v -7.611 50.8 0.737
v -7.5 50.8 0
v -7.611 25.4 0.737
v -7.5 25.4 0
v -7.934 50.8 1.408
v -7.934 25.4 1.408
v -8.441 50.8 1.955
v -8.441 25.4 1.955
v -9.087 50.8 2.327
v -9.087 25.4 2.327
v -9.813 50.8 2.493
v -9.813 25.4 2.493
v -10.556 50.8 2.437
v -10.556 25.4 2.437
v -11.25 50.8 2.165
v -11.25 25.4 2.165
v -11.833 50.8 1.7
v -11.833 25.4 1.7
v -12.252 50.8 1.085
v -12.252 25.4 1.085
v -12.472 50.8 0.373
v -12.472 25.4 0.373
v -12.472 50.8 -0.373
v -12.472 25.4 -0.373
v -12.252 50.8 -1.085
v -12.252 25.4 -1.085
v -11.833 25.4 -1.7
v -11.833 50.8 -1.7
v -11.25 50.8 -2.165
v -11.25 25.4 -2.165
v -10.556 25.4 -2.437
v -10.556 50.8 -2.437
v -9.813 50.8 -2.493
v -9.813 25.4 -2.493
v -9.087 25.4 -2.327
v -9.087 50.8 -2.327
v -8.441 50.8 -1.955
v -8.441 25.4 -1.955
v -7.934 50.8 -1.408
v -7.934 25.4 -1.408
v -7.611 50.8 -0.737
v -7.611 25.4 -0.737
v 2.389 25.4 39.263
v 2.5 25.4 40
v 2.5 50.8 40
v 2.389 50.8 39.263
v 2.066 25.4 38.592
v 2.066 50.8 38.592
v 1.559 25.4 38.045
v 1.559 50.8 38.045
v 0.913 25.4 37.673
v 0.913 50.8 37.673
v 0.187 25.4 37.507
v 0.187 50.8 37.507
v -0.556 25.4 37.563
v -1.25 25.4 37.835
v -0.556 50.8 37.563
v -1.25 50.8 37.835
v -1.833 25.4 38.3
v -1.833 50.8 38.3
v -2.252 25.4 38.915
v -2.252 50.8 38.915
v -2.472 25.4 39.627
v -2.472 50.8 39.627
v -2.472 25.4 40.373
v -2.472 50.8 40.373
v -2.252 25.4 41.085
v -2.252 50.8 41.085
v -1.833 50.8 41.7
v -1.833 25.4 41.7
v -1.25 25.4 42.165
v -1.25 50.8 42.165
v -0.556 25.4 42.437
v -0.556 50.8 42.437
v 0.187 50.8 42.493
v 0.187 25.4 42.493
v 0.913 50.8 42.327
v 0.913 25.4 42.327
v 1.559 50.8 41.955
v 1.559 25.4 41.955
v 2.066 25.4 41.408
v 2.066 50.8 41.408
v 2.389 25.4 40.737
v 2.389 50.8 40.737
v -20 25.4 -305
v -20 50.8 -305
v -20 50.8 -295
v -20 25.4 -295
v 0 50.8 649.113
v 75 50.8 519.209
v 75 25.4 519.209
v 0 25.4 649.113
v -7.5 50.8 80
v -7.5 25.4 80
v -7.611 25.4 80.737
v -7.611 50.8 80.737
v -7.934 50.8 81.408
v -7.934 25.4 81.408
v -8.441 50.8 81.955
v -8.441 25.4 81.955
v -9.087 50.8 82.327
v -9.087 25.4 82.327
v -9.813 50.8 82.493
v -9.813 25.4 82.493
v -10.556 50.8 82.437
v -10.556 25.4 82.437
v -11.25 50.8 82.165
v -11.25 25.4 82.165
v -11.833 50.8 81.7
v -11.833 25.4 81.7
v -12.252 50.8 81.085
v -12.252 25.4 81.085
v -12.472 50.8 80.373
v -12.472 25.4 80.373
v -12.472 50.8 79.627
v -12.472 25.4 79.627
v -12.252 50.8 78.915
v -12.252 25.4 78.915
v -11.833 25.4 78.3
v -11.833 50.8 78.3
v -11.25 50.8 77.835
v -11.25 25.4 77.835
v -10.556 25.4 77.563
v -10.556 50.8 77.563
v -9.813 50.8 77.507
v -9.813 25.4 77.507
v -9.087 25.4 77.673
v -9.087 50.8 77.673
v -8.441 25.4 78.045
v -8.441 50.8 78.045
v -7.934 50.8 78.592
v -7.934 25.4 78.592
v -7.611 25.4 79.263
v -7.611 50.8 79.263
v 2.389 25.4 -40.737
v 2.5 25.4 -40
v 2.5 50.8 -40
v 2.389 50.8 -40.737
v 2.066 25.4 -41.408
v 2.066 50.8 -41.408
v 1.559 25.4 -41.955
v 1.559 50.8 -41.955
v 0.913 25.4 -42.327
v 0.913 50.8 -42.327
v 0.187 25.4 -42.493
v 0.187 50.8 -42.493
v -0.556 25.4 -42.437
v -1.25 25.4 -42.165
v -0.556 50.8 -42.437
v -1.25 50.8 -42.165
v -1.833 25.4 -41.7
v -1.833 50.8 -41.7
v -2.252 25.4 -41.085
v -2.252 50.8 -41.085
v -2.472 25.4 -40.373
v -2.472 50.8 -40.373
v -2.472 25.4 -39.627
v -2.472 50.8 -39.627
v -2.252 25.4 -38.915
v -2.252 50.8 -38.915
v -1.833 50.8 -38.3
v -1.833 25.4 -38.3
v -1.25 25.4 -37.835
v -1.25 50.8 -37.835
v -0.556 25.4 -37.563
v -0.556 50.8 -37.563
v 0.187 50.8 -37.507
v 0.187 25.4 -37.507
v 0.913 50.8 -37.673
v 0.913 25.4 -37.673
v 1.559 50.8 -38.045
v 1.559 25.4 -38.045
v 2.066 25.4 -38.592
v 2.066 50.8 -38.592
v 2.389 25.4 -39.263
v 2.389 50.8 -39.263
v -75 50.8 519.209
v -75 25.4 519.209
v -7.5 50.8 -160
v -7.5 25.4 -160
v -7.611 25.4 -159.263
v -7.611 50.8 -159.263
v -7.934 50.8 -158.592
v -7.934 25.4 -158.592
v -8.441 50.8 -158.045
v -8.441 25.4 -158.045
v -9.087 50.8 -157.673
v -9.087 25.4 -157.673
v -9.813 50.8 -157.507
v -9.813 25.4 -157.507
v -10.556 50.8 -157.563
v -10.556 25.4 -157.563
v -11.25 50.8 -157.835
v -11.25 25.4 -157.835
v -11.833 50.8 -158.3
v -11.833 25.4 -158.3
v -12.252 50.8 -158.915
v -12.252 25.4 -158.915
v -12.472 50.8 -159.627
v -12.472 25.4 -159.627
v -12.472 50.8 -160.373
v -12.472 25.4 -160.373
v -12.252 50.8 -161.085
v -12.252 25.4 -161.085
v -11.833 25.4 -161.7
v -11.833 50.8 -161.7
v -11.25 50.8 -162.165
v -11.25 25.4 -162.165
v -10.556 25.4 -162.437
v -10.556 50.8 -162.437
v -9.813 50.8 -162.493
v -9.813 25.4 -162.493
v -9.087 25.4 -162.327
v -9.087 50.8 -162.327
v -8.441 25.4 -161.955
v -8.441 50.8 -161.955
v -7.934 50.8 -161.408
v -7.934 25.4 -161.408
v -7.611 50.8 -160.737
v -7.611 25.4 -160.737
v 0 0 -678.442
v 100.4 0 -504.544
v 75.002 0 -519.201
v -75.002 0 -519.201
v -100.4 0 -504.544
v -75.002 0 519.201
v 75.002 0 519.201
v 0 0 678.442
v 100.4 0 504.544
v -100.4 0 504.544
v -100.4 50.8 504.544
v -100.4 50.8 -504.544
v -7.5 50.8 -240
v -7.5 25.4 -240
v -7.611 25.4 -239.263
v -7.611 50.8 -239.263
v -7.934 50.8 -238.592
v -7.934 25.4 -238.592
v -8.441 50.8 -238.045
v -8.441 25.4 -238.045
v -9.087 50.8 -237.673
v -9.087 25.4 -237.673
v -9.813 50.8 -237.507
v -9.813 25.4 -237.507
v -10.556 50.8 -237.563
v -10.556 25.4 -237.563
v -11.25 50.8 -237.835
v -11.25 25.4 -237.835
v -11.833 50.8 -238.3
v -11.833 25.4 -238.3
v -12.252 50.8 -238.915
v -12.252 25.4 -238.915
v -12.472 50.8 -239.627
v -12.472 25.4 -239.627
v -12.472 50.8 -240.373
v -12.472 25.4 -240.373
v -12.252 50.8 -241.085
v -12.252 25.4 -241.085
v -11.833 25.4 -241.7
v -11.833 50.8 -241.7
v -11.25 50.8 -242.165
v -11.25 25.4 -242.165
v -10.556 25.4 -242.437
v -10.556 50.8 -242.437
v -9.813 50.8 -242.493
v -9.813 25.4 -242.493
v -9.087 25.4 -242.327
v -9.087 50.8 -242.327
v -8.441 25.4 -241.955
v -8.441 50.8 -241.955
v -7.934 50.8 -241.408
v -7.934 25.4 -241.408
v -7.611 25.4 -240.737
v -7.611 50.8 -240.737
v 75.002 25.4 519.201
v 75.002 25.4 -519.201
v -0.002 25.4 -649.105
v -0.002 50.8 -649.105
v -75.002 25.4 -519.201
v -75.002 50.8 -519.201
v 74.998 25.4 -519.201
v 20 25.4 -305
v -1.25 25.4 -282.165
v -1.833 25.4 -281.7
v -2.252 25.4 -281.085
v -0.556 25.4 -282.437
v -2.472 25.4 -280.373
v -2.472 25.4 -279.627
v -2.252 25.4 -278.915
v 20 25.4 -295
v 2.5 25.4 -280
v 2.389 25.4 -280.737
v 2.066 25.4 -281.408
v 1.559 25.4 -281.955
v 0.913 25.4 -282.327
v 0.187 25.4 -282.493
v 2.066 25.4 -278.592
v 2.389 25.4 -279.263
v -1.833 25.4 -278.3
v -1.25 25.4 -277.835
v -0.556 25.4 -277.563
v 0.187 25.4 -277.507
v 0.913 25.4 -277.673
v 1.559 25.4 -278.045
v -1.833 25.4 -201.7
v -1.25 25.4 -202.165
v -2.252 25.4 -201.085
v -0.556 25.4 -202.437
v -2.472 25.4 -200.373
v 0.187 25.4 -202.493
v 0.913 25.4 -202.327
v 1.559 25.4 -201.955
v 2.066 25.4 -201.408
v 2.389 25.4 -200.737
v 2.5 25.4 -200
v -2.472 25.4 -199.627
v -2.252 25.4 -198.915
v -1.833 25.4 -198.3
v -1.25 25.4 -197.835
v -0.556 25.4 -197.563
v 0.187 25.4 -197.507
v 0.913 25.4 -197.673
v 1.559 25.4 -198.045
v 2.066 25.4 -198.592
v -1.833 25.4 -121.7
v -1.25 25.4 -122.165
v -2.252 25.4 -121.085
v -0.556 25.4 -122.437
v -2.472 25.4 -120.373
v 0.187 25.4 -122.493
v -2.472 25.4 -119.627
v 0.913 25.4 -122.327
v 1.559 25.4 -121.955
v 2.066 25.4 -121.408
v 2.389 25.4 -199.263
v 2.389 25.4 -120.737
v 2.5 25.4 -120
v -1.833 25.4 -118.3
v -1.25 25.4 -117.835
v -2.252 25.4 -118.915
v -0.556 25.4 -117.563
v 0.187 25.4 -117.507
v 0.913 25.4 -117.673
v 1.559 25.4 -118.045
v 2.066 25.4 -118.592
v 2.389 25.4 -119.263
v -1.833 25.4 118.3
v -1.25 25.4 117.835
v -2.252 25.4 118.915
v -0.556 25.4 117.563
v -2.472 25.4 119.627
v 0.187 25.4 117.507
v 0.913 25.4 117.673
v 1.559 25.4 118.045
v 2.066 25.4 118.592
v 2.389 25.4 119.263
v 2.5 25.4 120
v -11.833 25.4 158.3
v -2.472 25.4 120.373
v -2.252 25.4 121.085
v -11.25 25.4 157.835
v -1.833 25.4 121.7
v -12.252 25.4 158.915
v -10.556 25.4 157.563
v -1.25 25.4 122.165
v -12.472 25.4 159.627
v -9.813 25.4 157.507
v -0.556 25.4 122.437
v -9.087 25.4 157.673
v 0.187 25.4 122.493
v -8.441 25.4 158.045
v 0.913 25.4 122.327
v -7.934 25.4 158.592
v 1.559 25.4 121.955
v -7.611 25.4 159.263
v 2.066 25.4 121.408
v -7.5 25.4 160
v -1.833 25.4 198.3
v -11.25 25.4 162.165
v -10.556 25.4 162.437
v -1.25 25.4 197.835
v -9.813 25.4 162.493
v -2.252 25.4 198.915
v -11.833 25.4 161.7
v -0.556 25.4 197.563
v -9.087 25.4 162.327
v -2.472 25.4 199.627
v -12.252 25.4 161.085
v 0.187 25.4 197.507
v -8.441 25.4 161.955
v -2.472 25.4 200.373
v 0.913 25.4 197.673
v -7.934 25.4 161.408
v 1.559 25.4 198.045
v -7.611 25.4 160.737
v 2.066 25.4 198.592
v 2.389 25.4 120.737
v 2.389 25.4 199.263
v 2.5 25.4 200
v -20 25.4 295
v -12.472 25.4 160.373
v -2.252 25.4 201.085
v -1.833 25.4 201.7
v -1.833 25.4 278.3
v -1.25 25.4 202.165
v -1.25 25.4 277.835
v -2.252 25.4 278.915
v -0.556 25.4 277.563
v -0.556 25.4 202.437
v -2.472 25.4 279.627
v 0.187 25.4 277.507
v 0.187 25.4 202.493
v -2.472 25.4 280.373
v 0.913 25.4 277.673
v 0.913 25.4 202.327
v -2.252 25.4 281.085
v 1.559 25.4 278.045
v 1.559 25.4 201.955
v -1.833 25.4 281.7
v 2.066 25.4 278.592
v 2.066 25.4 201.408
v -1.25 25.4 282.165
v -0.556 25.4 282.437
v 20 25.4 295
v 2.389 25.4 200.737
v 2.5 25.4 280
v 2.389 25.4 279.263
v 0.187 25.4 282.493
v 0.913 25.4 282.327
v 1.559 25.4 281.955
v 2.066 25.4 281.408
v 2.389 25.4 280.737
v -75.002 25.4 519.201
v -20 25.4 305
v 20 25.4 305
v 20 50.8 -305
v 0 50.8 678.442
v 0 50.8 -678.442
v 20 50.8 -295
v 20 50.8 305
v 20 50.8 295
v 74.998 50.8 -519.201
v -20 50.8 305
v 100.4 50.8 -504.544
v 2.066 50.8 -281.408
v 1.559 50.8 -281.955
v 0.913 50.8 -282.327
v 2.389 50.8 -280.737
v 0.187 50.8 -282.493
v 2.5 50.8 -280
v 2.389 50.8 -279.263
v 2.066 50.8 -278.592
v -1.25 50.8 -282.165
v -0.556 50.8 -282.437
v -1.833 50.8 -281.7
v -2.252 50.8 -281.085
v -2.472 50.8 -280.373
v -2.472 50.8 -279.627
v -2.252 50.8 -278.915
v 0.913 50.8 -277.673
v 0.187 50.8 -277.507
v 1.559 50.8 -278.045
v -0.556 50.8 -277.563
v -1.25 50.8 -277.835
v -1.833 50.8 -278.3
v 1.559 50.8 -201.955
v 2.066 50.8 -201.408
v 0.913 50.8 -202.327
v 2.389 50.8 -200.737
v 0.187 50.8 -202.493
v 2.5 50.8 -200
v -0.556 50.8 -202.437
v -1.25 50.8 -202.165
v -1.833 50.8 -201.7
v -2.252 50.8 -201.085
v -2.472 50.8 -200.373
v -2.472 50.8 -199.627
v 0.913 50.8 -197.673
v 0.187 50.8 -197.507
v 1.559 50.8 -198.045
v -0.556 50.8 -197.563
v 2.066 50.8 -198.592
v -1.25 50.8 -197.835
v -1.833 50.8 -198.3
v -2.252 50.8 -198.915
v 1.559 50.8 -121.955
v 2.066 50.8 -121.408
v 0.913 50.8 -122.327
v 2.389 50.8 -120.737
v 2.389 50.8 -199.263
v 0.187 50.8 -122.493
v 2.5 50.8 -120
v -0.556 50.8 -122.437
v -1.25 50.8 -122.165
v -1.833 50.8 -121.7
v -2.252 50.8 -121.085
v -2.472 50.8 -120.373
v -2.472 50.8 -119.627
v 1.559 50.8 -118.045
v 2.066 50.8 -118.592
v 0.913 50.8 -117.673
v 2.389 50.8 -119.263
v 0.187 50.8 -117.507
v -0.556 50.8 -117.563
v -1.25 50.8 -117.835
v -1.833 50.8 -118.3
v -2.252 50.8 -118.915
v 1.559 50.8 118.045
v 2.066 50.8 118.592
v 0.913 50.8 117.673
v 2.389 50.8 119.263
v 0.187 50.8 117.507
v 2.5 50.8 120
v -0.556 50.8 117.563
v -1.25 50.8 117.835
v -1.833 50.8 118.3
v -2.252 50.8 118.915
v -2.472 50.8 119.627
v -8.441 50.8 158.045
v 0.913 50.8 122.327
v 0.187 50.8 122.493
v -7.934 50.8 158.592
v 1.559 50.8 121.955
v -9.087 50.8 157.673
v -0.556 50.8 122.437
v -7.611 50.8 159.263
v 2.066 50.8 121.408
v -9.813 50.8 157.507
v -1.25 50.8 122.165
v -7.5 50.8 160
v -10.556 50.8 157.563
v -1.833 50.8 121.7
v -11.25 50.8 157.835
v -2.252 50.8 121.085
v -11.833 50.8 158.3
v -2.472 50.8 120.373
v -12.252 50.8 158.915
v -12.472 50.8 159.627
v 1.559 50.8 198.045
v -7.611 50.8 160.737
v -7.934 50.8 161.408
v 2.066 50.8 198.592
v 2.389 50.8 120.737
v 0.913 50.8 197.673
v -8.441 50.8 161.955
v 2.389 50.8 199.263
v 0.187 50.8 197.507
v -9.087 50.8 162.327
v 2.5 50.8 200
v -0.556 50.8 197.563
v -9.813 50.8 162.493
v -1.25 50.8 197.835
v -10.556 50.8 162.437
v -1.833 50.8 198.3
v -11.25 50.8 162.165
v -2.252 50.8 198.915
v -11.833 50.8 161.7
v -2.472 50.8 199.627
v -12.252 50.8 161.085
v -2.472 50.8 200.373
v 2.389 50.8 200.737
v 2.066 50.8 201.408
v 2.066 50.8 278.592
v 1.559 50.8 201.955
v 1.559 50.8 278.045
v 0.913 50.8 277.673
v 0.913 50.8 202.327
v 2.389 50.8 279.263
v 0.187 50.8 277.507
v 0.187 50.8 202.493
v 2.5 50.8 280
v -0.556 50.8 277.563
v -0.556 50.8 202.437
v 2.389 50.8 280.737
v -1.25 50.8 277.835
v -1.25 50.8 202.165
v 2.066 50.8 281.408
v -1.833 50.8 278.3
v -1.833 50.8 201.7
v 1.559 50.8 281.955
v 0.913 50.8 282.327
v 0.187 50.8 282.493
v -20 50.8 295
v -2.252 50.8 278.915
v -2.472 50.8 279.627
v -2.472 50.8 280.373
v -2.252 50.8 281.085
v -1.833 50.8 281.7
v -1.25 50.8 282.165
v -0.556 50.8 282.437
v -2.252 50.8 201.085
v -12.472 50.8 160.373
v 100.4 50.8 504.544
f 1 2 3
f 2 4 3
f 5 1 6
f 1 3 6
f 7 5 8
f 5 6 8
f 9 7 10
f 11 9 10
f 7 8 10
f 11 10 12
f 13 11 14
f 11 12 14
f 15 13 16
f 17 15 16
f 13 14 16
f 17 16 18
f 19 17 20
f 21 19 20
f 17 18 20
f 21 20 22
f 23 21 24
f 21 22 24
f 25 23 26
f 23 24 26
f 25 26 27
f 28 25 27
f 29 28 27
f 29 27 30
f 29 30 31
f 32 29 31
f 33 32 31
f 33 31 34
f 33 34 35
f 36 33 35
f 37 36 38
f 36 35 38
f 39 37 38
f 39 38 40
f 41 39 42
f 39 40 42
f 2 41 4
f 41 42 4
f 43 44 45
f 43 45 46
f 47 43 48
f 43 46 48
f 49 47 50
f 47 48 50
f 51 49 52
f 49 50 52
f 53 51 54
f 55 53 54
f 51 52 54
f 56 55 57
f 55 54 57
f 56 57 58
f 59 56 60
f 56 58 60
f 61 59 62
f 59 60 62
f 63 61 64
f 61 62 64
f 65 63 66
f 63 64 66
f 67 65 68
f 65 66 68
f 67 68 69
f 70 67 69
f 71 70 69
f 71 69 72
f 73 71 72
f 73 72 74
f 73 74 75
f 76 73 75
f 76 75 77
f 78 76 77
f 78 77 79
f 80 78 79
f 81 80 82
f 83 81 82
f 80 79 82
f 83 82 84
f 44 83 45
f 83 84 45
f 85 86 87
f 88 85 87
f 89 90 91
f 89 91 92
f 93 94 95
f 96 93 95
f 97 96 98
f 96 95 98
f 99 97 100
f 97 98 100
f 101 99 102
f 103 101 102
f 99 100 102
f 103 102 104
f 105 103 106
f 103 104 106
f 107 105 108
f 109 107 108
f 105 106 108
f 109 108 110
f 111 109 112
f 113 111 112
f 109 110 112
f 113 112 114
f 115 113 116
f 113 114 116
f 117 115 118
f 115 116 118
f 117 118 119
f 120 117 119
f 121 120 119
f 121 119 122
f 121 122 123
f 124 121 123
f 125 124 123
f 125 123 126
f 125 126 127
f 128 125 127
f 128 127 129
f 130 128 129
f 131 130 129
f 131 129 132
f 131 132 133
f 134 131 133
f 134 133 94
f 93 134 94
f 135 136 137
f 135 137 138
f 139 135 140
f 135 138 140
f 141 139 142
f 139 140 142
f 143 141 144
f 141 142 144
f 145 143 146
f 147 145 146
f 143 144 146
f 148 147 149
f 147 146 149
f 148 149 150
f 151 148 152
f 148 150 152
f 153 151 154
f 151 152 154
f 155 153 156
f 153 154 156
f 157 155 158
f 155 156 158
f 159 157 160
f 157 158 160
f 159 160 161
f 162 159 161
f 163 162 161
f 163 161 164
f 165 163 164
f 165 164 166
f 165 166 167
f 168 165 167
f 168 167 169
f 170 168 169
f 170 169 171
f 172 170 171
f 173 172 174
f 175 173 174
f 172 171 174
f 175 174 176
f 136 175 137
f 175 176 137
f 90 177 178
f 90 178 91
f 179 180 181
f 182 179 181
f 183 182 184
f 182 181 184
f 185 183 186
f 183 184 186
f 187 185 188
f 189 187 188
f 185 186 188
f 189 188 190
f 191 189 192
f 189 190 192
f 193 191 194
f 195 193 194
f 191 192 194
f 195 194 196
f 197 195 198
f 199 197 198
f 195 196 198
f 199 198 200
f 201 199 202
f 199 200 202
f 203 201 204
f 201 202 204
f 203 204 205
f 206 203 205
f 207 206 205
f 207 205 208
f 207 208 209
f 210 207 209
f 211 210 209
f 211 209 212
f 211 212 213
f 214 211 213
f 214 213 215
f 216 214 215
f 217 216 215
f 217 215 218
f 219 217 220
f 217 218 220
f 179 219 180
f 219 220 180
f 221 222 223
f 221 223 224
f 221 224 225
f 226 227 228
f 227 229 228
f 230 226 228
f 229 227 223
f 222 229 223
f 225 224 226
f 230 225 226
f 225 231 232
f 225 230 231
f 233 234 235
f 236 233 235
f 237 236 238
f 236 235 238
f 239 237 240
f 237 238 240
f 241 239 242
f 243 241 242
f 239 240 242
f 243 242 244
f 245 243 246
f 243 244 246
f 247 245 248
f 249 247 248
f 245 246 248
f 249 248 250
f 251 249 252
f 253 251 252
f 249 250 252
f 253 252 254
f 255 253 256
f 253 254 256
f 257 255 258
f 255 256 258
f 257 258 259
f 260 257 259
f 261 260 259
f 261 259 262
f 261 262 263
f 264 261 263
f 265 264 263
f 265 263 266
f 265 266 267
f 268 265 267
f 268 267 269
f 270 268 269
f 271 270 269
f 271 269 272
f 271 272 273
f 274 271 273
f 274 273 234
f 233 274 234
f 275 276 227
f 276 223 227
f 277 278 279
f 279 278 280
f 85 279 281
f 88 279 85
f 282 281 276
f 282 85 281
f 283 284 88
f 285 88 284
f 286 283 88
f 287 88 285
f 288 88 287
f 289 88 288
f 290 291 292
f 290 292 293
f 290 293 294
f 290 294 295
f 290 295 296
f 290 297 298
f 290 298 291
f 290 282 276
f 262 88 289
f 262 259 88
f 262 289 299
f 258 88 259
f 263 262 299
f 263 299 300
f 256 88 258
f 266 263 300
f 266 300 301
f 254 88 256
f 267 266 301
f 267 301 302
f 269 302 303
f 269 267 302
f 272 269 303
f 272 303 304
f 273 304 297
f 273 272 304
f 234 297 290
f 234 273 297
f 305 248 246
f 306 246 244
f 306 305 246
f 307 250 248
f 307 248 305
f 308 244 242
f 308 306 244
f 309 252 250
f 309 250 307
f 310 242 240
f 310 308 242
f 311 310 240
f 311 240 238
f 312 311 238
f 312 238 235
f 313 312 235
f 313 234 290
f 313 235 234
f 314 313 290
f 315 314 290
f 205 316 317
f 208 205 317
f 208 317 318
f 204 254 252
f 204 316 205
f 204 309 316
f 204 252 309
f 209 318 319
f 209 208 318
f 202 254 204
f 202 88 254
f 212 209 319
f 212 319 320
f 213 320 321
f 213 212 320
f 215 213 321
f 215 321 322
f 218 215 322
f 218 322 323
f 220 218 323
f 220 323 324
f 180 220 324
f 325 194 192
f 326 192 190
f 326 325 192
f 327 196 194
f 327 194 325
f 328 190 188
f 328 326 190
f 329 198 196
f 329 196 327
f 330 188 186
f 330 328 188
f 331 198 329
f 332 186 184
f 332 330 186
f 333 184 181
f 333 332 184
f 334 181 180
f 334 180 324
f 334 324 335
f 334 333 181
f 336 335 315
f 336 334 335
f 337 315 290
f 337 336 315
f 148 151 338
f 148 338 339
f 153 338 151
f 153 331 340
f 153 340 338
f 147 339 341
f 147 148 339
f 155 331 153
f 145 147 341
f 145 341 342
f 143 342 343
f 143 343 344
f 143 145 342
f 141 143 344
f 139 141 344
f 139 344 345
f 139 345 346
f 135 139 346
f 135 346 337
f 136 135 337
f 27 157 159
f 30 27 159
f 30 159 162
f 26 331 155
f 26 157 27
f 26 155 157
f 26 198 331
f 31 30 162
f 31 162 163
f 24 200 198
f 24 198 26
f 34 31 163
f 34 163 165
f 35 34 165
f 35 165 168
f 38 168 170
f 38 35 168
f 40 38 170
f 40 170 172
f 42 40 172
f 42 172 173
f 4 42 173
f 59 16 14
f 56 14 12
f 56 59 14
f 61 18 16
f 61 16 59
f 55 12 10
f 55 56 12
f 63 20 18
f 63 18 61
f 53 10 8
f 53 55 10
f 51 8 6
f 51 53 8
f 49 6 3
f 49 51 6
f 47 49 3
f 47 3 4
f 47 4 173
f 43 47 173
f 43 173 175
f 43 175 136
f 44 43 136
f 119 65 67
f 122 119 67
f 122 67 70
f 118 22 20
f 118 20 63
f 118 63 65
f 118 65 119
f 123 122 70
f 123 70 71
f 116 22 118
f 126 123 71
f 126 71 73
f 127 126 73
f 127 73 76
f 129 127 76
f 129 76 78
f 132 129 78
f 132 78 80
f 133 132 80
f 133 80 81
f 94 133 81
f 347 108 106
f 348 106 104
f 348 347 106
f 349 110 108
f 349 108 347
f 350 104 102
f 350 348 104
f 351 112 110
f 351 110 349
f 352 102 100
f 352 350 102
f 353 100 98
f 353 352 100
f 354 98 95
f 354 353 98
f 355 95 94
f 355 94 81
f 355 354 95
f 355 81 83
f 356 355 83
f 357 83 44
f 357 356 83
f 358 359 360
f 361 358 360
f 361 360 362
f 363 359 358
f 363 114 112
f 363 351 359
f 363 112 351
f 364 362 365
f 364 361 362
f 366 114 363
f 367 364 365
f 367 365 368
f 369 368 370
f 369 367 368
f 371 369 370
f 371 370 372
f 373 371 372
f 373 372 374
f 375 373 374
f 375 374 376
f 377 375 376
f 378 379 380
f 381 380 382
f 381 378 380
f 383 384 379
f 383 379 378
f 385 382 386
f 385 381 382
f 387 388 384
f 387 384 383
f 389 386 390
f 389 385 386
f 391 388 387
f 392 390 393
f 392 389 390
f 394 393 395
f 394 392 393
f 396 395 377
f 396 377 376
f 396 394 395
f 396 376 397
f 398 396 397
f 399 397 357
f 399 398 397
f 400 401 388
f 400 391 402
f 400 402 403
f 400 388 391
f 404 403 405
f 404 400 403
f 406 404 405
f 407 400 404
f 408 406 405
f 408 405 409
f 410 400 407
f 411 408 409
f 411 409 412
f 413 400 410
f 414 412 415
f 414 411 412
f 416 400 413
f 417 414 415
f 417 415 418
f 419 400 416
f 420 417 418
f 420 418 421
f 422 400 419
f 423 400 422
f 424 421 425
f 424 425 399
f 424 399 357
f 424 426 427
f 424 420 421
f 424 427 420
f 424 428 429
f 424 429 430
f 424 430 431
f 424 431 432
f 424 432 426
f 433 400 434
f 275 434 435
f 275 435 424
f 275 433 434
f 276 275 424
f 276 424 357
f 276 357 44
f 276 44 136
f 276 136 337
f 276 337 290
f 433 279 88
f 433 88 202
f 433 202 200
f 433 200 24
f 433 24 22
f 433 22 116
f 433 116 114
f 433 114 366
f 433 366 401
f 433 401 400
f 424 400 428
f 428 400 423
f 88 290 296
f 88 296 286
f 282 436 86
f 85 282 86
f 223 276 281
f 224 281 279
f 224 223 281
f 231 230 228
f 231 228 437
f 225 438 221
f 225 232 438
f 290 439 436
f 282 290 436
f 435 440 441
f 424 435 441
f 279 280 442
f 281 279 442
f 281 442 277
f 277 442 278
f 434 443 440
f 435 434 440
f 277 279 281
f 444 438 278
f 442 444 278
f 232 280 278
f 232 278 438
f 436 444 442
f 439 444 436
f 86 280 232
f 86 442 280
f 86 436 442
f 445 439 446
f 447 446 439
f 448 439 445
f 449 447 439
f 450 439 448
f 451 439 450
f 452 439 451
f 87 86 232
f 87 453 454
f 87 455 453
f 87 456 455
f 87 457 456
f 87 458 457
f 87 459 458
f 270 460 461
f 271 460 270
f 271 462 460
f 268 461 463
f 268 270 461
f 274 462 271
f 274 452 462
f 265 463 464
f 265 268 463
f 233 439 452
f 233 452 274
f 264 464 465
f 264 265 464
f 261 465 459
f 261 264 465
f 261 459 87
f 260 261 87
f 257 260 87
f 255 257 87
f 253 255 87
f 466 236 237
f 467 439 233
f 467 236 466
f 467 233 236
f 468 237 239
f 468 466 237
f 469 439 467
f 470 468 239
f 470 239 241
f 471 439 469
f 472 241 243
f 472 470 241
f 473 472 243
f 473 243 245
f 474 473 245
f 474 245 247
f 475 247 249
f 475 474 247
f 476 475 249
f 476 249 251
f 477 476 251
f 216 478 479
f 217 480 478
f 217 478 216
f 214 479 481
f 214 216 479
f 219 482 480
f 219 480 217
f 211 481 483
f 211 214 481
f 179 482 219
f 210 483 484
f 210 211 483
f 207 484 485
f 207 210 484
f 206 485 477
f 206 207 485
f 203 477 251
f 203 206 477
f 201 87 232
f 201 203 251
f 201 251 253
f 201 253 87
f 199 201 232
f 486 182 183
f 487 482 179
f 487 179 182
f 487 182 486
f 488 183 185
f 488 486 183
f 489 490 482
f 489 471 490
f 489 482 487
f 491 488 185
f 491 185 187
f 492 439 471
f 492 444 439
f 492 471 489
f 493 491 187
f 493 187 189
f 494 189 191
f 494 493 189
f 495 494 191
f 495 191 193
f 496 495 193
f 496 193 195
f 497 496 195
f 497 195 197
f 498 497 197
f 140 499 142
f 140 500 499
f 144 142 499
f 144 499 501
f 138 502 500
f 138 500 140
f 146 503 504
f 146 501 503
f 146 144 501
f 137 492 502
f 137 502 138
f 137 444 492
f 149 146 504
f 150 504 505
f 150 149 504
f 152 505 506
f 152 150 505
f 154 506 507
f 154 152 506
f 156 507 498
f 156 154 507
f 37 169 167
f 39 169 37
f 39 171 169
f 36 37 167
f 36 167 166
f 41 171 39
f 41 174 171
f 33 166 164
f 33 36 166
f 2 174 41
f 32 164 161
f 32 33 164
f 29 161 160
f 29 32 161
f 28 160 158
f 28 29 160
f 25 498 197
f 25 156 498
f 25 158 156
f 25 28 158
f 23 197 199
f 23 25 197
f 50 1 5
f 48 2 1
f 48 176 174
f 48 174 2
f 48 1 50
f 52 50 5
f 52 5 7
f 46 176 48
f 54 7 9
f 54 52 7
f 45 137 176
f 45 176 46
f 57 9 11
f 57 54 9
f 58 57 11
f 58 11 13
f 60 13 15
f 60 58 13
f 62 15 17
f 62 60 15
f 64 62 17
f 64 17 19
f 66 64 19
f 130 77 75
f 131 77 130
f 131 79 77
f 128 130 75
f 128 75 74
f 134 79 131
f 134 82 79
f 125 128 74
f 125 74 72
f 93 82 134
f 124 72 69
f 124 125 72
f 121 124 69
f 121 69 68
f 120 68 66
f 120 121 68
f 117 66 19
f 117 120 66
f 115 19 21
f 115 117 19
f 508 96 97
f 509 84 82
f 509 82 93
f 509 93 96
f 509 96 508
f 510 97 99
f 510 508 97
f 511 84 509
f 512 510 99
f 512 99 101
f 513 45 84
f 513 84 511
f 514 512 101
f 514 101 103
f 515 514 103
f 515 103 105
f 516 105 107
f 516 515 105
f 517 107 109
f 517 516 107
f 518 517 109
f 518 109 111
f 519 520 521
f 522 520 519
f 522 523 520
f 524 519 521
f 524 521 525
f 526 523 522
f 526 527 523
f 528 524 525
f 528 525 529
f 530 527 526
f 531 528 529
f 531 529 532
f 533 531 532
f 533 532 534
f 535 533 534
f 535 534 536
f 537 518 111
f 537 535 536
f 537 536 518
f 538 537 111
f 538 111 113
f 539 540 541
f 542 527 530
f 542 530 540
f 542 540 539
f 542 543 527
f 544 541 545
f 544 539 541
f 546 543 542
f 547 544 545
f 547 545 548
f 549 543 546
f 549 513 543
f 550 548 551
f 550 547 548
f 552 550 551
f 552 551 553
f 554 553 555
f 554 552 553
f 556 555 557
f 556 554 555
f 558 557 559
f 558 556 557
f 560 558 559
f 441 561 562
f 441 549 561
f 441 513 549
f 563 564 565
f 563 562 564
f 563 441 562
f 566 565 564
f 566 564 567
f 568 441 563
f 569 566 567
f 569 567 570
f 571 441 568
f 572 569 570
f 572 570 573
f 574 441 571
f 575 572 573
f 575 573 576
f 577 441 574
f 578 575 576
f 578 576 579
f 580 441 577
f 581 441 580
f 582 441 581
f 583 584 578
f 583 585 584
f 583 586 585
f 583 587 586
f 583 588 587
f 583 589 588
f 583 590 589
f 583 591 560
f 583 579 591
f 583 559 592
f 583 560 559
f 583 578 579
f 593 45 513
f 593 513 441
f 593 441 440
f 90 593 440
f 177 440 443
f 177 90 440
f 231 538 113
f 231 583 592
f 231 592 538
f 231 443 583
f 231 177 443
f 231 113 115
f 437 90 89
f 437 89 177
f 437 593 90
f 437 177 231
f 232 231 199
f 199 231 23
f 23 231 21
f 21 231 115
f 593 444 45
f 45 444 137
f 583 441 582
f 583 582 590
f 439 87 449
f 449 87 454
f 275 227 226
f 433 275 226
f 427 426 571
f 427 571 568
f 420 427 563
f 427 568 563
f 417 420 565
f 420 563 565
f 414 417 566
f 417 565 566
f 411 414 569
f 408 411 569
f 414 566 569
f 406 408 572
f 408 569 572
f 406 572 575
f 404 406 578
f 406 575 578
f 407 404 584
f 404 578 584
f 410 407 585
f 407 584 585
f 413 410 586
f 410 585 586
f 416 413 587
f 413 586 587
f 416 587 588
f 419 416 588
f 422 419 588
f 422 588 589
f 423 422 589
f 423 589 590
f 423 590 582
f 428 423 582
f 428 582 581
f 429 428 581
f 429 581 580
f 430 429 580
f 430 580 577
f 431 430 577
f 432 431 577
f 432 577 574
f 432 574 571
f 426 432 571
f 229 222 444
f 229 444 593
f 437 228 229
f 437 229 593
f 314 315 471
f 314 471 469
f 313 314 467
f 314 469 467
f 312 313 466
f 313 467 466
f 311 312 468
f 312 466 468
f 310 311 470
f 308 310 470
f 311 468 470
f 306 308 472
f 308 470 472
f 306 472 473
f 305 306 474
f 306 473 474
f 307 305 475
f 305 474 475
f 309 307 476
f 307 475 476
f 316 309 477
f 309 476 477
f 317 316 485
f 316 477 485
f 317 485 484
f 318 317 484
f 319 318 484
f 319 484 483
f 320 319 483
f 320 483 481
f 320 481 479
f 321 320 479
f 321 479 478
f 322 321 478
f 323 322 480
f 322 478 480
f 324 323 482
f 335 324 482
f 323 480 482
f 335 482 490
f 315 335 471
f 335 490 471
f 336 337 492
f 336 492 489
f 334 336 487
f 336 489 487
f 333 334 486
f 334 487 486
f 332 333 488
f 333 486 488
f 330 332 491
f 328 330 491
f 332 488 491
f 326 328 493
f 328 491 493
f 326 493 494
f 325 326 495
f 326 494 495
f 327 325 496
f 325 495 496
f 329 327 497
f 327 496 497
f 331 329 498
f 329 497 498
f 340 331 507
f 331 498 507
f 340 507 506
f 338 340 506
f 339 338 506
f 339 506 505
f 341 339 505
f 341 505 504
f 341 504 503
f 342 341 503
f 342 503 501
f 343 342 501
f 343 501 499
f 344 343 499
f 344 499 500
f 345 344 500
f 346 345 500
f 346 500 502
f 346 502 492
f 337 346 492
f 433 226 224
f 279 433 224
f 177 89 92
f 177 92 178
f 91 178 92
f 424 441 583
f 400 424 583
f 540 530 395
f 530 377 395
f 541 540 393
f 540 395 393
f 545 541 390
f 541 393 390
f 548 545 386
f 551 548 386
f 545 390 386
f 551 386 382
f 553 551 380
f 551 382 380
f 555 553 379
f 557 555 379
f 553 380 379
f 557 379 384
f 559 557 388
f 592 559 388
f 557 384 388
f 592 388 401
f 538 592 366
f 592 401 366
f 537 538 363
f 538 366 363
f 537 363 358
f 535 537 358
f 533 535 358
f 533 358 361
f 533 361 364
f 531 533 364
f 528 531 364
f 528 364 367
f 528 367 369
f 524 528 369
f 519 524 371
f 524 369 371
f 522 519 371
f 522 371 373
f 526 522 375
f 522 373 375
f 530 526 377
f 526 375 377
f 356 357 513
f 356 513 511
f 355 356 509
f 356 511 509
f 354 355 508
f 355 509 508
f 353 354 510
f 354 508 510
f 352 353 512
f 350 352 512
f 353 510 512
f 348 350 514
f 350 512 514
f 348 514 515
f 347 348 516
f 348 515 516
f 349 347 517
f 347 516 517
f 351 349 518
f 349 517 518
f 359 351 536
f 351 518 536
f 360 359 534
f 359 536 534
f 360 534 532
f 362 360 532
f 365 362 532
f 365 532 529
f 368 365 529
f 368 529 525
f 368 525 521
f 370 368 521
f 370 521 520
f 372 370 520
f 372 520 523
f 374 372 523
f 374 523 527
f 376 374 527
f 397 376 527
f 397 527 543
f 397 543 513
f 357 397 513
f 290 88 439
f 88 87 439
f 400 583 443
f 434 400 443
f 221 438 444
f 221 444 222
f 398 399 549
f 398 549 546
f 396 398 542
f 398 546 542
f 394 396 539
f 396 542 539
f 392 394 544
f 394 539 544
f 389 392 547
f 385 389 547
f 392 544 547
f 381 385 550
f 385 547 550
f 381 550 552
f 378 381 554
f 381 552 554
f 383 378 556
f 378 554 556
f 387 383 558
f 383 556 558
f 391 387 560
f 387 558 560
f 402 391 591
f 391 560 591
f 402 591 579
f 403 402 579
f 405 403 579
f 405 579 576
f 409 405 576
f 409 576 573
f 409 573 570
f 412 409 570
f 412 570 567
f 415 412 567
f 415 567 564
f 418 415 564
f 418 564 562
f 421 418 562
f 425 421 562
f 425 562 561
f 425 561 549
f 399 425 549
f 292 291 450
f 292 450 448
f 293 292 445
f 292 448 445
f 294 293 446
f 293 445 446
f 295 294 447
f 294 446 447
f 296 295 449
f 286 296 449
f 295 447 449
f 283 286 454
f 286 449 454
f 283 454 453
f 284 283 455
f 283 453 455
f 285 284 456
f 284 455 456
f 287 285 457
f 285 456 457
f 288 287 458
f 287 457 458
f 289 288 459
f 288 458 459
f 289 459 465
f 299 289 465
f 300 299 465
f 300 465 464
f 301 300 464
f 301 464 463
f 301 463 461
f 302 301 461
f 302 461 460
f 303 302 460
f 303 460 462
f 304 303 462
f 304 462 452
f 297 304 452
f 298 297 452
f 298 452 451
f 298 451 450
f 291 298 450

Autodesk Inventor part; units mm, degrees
sketch "Sketch1" plane through (0, 0, 0) normal (0, 1, 0) x (-1, 0, 0)
  line L0 (-100.4, 678.442) -> (100.4, 678.442)
  line L1 (100.4, 678.442) -> (100.4, -678.442)
  line L2 (100.4, -678.442) -> (-100.4, -678.442)
  line L3 (-100.4, -678.442) -> (-100.4, 678.442)
  line L4 (-100.4, 678.442) -> (100.4, -678.442) construction
  line L5 (100.4, 678.442) -> (-100.4, -678.442) construction
  point P0 (0, 0)
  dimension "d0" = 200.8
  dimension "d1" = 1356.884
extrude "Extrusion1" add sketch "Sketch1" along normal blind 50.8
sketch "Sketch2" plane through (0, 50.8, 0) normal (0, 1, 0) x (1, 0, 0)
  line L0 (-100.4, -678.442) -> (100.4, -678.442) projected
  line L1 (0, -678.442) -> (-100.4, -504.5441)
  line L2 (0, -678.442) -> (200.8, -678.442) construction
  line L3 (-100.4, -504.5441) -> (100.4, -504.5441)
  line L4 (100.4, -678.442) -> (100.4, 678.442) projected
  line L5 (0, -678.442) -> (100.4, -504.5441)
  line L6 (0, 678.442) -> (-100.4062, 504.5334)
  line L7 (0, 678.442) -> (200.8124, 678.442) construction
  line L8 (-100.4062, 504.5334) -> (100.4, 504.5334)
  line L9 (0, 678.442) -> (100.4, 504.5334)
  point P0 (0, 0)
  dimension "d10" = 150
  dimension "d11" = 150
  dimension "d12" = 60
  dimension "d4" = 200.8
  dimension "d5" = 120
  dimension "d6" = 200.8124
  dimension "d7" = 120
ref_plane "Work Plane1" through (0, 50.8, 678.442) normal (0.866, 0, 0.5) x (0, -1, 0)
split "Split1" plane through (0, 50.8, 678.442) removes the side toward (0.866, 0, 0.5)
ref_plane "Work Plane2" through (0, 0, 678.442) normal (-0.866, 0, 0.5) x (0, 1, 0)
ref_plane "Work Plane3" through (0, 0, -678.442) normal (0.866, 0, 0.5) x (0, 1, 0)
split "Split2" plane through (0, 0, -678.442) removes the side toward (-0.866, 0, -0.5)
split "Split3" plane through (0, 0, 678.442) removes the side toward (-0.866, 0, 0.5)
ref_plane "Work Plane4" through (0, 0, -678.442) normal (0.866, 0, -0.5) x (0, 1, 0)
split "Split4" plane through (0, 0, -678.442) removes the side toward (0.866, 0, -0.5)
sketch "Sketch3" plane through (0, 50.8, 0) normal (0, 1, 0) x (1, 0, 0)
  line L0 (-75, -519.2088) -> (75, -519.2088)
  line L1 (75, -519.2088) -> (0, -649.1126)
  line L2 (0, -649.1126) -> (-75, -519.2088)
  line L3 (-75.0016, 519.2007) -> (74.9984, 519.2007)
  line L4 (74.9984, 519.2007) -> (-0.0016, 649.1046)
  line L5 (-0.0016, 649.1046) -> (-75.0016, 519.2007)
  circle A0 centre (-0.0016, 562.502) radius 43.3013
  circle A1 centre (-0.0016, 562.502) radius 57.9687
  point P0 (0, 0)
  dimension "d6" = 200.8124
  dimension "d7" = 120
  dimension "d8" = 150
  dimension "d9" = 150
  dimension "d10" = 150
  dimension "d11" = 150
  dimension "d12" = 60
sketch "Sketch4" plane through (0, 50.8, 0) normal (0, 1, 0) x (1, 0, 0)
  point P0 (0, 0)
sketch "Sketch5" plane through (0, 50.8, 0) normal (0, 1, 0) x (1, 0, 0)
  point P0 (0, 0)
extrude "Extrusion2" cut sketch "Sketch3" against normal blind 25.4 contours L0 L1 L2
sketch "Sketch6" plane through (0, 50.8, 0) normal (0, 1, 0) x (1, 0, 0)
  line L0 (-75.0016, 519.2007) -> (74.9984, 519.2007)
  line L1 (74.9984, 519.2007) -> (-0.0016, 649.1046)
  line L2 (-0.0016, 649.1046) -> (-75.0016, 519.2007)
  point P0 (0, 0)
  dimension "d15" = 150
  dimension "d16" = 150
extrude "Extrusion3" cut sketch "Sketch6" against normal blind 25.4
sketch "Sketch11" plane through (0, 50.8, 0) normal (0, 1, 0) x (1, 0, 0)
  line L0 (-20, 295) -> (20, 295)
  line L1 (20, 295) -> (20, 305)
  line L2 (20, 305) -> (-20, 305)
  line L3 (-20, 305) -> (-20, 295)
  line L4 (-20, 295) -> (20, 305) construction
  line L5 (20, 295) -> (-20, 305) construction
  point P0 (0, 0)
  point P1 (0, 300)
  dimension "d42" = 40
  dimension "d43" = 10
extrude "Extrusion6" cut sketch "Sketch11" against normal blind 50.8
sketch "Sketch12" plane through (0, 50.8, 0) normal (0, 1, 0) x (1, 0, 0)
  line L0 (-20, -305) -> (20, -305)
  line L1 (20, -305) -> (20, -295)
  line L2 (20, -295) -> (-20, -295)
  line L3 (-20, -295) -> (-20, -305)
  line L4 (-20, -305) -> (20, -295) construction
  line L5 (20, -305) -> (-20, -295) construction
  point P0 (0, 0)
  point P1 (0, -300)
  dimension "d46" = 40
  dimension "d47" = 10
extrude "Extrusion7" cut sketch "Sketch12" against normal blind 50.8
sketch "Sketch13" plane through (0, 50.8, 0) normal (0, 1, 0) x (1, 0, 0)
  circle A0 centre (0, -40) radius 2.5
  circle A1 centre (0, -120) radius 2.5
  circle A2 centre (0, -200) radius 2.5
  circle A3 centre (0, -280) radius 2.5
  circle A4 centre (0, 40) radius 2.5
  circle A5 centre (0, 100) radius 2.5
  circle A6 centre (0, 200) radius 2.5
  point P0 (0, 0)
  dimension "d50" = 5
  dimension "d51" = 5
  dimension "d52" = 5
  dimension "d53" = 5
  dimension "d54" = 5
  dimension "d55" = 5
  dimension "d56" = 5
extrude "Extrusion8" cut sketch "Sketch13" against normal blind 50.8 contours A3
sketch "Sketch14" plane through (0, 50.8, 0) normal (0, 1, 0) x (1, 0, 0)
  circle A0 centre (0, -200) radius 2.5
  point P0 (0, 0)
  dimension "d59" = 5
extrude "Extrusion9" cut sketch "Sketch14" against normal blind 50.8
sketch "Sketch15" plane through (0, 50.8, 0) normal (0, 1, 0) x (1, 0, 0)
  circle A0 centre (0, -120) radius 2.5
  point P0 (0, 0)
  dimension "d62" = 5
extrude "Extrusion10" cut sketch "Sketch15" against normal blind 50.8
sketch "Sketch16" plane through (0, 50.8, 0) normal (0, 1, 0) x (1, 0, 0)
  circle A0 centre (0, -40) radius 2.5
  circle A1 centre (0, 40) radius 2.5
  point P0 (0, 0)
  dimension "d65" = 5
  dimension "d66" = 5
extrude "Extrusion11" cut sketch "Sketch16" against normal blind 50.8
sketch "Sketch17" plane through (0, 50.8, 0) normal (0, 1, 0) x (1, 0, 0)
  circle A0 centre (0, 120) radius 2.5
  circle A1 centre (0, 200) radius 2.5
  circle A2 centre (0, 280) radius 2.5
  point P0 (0, 0)
  dimension "d69" = 5
  dimension "d70" = 5
  dimension "d71" = 5
extrude "Extrusion12" cut sketch "Sketch17" against normal blind 50.8
sketch "Sketch18" plane through (0, 0, 0) normal (0, -1, 0) x (1, 0, 0)
  circle A0 centre (-10, -240) radius 2.5
  circle A1 centre (-10, -160) radius 2.5
  circle A2 centre (-10, 0) radius 2.5
  circle A3 centre (-10, 80) radius 2.5
  circle A4 centre (-10, 160) radius 2.5
  point P0 (0, 0)
  dimension "d74" = 5
  dimension "d75" = 5
  dimension "d76" = 5
  dimension "d77" = 5
  dimension "d78" = 5
extrude "Extrusion13" cut sketch "Sketch18" against normal blind 50.8
sketch "Sketch19" plane through (0, 0, 0) normal (0, -1, 0) x (1, 0, 0)
  line L0 (74.9984, -519.2007) -> (-75.0016, -519.2007) projected
  line L1 (75.0016, 519.2007) -> (-75.0016, 519.2007)
  line L2 (-75.0016, 519.2007) -> (-75.0016, -519.2007)
  line L3 (-75.0016, -519.2007) -> (75.0016, -519.2007)
  line L4 (75.0016, -519.2007) -> (75.0016, 519.2007)
  line L5 (75.0016, 519.2007) -> (-75.0016, -519.2007) construction
  line L6 (-75.0016, 519.2007) -> (75.0016, -519.2007) construction
  point P0 (0, 0)
extrude "Extrusion14" cut sketch "Sketch19" against normal blind 25.4
properties part number "top"
